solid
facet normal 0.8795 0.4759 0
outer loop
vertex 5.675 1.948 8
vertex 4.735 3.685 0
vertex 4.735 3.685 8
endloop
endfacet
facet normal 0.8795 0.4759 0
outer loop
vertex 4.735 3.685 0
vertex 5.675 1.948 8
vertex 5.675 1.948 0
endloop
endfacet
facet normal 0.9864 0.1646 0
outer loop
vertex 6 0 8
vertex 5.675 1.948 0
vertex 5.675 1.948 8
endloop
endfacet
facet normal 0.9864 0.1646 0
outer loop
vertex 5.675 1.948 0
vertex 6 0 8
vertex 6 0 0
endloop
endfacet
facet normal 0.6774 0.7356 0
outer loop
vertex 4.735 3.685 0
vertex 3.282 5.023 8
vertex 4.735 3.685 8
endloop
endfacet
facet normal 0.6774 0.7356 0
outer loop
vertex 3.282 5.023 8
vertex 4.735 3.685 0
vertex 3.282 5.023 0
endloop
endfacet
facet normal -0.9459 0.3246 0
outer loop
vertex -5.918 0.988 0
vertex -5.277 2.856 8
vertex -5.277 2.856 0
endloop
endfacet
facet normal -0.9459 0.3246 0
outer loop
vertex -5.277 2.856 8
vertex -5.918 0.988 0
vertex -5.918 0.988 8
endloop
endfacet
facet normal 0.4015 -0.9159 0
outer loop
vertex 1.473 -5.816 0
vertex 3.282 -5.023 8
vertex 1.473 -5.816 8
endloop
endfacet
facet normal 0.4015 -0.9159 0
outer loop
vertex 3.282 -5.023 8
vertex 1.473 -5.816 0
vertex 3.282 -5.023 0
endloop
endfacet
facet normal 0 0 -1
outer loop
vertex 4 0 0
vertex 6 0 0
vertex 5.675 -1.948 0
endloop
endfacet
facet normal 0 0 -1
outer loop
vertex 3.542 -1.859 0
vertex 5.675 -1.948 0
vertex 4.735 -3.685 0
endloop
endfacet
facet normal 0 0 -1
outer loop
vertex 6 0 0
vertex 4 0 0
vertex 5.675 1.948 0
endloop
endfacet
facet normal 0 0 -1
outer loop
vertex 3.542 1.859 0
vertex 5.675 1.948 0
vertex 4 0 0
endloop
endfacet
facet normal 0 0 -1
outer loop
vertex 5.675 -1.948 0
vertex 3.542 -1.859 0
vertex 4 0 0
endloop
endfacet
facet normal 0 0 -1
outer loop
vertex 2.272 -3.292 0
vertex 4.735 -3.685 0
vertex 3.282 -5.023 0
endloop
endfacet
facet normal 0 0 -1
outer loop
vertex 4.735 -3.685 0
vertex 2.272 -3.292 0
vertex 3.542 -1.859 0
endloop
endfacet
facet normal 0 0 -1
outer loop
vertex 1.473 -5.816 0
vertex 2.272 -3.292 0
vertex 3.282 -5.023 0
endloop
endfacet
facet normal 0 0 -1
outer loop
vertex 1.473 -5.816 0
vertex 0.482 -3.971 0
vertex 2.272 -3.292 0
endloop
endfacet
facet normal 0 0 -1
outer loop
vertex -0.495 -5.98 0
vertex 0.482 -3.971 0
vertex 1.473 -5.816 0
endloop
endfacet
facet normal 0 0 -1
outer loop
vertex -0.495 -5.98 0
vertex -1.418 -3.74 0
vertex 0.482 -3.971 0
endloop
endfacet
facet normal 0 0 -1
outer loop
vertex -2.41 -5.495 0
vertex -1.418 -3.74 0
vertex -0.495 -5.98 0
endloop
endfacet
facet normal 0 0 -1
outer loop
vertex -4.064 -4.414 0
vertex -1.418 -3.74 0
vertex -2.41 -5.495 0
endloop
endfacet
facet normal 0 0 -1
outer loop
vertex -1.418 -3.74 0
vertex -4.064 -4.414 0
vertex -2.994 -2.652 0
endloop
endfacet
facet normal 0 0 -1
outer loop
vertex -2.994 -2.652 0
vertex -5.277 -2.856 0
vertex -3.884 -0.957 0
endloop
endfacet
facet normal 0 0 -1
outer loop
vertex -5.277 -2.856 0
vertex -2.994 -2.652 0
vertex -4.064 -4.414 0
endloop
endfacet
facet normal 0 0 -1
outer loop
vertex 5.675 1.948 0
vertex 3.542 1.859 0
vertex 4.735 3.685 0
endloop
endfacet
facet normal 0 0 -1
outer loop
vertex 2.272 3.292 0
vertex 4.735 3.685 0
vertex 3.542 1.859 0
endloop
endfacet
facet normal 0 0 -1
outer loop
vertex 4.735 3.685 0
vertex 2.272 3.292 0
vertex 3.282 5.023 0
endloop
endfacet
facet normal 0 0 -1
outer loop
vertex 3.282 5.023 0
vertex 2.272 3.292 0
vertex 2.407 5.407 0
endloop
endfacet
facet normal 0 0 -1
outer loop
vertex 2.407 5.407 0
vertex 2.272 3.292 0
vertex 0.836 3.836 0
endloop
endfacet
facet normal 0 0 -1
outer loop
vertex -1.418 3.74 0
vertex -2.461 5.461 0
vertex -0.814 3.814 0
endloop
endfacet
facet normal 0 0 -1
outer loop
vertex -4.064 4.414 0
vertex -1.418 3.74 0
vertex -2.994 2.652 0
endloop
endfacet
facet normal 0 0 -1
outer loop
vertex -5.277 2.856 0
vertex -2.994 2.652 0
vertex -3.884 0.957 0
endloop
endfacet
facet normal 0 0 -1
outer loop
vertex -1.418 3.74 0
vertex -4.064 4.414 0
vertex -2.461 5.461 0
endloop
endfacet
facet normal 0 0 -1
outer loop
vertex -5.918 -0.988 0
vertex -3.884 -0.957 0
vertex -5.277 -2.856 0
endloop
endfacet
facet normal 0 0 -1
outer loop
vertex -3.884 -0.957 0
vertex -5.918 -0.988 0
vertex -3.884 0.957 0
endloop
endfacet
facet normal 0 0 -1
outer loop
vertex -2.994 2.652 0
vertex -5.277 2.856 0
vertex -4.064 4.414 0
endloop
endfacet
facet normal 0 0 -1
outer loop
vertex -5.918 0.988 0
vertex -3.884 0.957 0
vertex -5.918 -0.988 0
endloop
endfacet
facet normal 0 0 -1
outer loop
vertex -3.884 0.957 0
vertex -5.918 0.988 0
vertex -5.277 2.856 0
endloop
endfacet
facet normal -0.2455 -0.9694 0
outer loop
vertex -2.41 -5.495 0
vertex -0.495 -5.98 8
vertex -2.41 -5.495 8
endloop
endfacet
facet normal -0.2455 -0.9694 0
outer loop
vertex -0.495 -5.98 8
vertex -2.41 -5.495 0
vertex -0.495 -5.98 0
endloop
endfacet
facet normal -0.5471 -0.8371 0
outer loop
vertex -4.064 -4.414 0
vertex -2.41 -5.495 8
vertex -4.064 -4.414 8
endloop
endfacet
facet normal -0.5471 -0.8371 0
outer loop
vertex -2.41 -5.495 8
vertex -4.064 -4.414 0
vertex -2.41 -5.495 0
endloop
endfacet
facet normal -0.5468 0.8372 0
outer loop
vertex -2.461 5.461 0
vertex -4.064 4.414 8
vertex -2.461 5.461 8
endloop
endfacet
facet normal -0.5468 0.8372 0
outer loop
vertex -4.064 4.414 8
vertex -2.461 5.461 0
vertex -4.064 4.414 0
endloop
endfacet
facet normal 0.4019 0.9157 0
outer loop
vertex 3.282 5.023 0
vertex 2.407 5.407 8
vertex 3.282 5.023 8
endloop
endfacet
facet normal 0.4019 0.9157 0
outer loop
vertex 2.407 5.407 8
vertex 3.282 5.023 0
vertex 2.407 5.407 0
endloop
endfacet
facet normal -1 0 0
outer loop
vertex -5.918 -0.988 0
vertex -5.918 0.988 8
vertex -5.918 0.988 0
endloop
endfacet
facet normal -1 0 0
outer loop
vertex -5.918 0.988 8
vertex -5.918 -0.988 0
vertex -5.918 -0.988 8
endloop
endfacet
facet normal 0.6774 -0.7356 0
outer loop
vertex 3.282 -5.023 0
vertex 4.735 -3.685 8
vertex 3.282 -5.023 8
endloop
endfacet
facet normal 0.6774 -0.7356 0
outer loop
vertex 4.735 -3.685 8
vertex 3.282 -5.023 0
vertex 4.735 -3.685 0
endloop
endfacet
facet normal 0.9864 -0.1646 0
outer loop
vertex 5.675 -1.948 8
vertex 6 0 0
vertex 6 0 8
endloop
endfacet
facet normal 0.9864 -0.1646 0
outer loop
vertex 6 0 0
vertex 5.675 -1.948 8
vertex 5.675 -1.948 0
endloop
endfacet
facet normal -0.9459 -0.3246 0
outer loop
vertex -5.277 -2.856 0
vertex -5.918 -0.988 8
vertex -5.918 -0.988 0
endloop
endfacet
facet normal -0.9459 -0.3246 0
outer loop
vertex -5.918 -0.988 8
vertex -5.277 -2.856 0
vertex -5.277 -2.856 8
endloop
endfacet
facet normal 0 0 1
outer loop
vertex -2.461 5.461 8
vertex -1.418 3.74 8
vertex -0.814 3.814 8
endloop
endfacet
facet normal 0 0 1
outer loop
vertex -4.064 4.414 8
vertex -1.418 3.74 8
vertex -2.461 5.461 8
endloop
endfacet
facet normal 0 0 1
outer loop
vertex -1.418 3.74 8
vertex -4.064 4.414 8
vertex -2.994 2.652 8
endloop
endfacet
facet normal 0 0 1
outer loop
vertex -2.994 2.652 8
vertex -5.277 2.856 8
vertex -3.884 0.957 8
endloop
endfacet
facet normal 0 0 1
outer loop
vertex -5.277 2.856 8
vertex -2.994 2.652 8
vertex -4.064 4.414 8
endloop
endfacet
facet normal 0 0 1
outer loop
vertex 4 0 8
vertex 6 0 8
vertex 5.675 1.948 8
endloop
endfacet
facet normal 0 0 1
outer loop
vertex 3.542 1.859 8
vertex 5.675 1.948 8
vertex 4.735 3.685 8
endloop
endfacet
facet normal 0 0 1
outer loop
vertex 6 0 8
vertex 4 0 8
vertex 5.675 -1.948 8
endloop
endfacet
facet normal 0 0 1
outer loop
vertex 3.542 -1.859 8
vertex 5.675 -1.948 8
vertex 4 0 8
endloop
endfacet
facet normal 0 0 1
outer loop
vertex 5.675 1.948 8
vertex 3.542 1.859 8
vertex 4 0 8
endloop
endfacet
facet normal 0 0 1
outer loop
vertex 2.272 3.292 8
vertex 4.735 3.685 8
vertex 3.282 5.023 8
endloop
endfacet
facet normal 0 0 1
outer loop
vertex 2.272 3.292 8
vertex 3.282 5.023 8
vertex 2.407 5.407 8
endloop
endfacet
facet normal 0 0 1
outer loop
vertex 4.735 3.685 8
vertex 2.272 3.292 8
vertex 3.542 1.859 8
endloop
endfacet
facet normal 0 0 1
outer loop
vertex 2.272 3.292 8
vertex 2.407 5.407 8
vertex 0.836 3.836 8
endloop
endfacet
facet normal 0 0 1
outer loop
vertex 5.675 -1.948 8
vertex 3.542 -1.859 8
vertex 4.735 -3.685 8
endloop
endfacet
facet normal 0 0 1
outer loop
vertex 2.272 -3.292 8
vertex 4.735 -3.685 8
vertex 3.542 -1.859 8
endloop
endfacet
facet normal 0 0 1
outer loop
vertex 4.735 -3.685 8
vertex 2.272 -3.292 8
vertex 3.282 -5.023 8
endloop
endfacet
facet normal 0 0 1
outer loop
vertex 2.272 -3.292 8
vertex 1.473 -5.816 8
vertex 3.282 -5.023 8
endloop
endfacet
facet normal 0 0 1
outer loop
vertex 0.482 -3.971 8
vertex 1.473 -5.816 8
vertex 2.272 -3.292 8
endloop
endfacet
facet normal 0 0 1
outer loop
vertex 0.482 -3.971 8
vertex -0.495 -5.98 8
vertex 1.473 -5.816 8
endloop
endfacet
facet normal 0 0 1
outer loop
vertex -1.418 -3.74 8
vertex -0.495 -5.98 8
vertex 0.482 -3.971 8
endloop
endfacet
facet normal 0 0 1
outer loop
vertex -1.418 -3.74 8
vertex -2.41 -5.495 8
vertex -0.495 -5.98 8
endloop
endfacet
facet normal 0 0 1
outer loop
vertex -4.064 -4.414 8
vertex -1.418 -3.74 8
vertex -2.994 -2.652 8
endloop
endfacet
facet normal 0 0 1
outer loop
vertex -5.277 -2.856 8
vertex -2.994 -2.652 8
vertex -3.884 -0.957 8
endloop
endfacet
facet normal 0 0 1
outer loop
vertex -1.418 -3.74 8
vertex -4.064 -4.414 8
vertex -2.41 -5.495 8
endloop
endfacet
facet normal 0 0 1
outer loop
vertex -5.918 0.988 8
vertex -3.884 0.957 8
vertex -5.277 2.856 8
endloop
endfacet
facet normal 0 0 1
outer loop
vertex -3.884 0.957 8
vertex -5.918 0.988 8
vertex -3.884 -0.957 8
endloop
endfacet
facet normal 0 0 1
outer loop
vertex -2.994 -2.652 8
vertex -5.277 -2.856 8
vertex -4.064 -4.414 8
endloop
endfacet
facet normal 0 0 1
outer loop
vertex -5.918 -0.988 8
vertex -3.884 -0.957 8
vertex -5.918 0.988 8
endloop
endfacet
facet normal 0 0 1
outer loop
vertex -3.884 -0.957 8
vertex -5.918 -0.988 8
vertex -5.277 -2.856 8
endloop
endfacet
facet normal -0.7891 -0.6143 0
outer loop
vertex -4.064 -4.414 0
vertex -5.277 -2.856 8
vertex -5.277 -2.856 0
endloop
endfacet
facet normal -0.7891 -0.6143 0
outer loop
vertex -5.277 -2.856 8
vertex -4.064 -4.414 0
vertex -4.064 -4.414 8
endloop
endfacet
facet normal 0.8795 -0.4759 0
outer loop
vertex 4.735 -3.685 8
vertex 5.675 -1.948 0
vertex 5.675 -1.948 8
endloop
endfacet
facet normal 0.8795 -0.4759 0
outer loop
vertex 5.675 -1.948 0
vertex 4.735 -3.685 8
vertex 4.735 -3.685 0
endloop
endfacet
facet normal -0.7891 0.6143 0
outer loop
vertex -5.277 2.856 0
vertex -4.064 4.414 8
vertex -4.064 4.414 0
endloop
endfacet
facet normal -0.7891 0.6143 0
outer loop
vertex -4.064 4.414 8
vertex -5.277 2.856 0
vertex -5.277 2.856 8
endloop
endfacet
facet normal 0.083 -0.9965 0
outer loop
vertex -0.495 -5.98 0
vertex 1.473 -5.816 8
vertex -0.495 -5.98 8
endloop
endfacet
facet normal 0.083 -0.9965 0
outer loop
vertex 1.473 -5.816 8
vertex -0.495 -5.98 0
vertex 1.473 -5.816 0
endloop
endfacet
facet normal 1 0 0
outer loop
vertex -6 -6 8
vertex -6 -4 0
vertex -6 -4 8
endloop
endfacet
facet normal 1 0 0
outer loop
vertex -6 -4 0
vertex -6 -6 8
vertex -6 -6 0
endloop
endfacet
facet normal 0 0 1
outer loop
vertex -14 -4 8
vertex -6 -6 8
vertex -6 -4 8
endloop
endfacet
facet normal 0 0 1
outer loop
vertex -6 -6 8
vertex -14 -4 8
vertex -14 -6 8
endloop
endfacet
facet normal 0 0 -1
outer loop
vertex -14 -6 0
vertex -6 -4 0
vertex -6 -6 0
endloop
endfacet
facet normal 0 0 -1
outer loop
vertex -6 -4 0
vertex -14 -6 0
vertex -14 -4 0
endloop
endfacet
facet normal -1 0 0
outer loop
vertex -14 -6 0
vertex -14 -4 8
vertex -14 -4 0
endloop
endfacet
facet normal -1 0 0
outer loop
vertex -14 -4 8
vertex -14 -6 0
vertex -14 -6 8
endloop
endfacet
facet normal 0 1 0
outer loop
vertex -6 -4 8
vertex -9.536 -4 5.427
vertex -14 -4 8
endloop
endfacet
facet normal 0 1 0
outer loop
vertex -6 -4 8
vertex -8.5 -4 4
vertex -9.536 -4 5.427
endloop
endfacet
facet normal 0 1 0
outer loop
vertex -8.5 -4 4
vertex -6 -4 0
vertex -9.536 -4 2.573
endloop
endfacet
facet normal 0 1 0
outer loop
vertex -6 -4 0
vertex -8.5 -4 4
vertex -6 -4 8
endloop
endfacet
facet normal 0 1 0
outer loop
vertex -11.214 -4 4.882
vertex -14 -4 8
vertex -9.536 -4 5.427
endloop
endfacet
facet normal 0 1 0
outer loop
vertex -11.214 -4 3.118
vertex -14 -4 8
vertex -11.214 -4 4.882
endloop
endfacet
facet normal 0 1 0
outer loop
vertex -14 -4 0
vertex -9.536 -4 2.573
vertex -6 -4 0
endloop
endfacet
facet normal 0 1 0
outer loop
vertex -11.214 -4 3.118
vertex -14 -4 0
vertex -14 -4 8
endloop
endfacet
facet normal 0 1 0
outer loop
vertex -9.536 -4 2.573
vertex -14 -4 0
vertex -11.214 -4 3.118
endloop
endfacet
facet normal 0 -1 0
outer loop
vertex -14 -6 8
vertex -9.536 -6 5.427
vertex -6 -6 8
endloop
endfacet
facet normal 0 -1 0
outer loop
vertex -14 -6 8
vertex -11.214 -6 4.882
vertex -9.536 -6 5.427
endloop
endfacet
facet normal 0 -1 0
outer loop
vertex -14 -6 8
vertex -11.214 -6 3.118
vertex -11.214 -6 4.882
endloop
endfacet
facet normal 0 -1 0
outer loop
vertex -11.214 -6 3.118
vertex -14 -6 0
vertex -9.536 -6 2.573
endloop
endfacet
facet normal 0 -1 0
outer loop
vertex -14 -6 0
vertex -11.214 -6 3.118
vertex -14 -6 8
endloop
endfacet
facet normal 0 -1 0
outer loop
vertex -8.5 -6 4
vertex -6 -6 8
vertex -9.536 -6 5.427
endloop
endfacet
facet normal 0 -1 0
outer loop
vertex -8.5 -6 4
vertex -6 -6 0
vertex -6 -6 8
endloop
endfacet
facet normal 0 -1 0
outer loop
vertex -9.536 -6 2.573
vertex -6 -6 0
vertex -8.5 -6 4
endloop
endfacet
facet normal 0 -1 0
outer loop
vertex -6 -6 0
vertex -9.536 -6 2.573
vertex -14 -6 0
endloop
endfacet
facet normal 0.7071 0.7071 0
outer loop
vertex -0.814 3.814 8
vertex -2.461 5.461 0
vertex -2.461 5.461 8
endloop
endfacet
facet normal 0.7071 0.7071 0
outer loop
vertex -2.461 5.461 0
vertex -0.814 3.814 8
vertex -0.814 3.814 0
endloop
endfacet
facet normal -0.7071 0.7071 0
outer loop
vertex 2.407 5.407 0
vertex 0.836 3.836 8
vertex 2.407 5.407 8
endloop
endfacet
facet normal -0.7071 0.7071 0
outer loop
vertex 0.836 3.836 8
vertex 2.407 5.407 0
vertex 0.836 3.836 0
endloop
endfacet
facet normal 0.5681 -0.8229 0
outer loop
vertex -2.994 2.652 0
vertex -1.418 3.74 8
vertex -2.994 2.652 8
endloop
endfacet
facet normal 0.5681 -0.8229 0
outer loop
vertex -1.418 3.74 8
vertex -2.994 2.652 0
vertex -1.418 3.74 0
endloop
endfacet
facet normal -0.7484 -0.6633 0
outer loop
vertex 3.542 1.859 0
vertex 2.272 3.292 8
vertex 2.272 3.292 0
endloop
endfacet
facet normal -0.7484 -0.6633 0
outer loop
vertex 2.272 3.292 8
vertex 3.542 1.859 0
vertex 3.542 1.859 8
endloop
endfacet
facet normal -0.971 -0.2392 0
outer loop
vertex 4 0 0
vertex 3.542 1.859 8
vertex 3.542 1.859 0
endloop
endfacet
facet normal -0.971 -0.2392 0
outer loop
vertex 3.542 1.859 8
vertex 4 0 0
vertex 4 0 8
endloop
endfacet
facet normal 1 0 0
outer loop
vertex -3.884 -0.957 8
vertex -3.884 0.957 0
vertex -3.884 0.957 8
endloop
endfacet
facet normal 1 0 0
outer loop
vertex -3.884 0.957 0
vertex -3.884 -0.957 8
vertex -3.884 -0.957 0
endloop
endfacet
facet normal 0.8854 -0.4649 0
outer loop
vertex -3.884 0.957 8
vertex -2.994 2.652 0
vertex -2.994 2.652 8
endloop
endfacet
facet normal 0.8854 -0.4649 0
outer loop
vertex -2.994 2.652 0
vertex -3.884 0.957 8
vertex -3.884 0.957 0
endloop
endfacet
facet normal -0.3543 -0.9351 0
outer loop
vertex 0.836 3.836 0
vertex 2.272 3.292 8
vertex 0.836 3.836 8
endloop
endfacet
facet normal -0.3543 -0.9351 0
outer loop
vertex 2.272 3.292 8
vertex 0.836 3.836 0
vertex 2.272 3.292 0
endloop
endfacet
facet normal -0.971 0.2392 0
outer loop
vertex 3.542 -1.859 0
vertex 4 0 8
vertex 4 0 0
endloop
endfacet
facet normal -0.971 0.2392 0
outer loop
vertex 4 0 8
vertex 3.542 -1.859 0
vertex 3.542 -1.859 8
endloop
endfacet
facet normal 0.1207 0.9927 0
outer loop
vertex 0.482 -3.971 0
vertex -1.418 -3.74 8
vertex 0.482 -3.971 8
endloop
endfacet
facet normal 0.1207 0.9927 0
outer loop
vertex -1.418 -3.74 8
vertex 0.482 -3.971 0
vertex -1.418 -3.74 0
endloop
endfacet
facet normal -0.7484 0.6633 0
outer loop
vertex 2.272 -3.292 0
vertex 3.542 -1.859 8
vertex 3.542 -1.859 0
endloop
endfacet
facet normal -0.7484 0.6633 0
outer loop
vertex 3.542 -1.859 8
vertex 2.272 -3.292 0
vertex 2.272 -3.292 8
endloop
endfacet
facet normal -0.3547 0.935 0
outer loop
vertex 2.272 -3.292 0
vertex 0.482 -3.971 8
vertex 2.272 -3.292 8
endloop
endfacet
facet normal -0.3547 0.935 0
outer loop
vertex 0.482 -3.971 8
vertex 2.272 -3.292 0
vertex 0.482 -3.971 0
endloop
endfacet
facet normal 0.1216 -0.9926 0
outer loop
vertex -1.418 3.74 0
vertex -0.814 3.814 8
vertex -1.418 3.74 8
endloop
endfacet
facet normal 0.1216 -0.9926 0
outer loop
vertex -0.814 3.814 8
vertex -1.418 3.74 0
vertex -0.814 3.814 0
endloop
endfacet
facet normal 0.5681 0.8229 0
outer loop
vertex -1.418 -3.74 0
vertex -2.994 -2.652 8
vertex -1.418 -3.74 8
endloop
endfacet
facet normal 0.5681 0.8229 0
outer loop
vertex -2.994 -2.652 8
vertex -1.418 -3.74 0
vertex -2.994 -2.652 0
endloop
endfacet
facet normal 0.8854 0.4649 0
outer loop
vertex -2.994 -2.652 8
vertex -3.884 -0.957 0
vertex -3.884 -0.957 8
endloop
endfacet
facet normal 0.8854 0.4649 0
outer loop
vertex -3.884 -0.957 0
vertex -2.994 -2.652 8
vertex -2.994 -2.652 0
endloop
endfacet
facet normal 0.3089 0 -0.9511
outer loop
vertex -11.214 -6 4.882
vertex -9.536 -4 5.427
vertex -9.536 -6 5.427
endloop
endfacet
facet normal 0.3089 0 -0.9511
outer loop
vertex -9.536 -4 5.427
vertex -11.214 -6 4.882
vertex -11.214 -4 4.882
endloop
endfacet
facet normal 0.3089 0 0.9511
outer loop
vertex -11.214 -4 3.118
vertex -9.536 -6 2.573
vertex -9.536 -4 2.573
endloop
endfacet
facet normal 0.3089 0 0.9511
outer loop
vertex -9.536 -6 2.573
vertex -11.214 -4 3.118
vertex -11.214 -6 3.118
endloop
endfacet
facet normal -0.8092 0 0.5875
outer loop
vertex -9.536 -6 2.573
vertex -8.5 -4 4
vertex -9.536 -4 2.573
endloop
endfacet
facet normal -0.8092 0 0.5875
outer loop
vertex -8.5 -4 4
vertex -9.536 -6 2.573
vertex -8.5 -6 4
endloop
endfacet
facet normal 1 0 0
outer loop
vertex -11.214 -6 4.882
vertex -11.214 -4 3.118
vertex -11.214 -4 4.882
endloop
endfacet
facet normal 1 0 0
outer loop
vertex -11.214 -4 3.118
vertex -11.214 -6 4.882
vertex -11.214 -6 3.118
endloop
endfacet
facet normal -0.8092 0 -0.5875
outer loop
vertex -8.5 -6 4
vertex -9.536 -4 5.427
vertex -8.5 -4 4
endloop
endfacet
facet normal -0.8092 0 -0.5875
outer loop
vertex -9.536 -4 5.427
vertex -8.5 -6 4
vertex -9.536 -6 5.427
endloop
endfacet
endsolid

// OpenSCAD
// Zweck: cable clip – ring with opening, screw tab; intersection cuts the opening.
d_cable = 8; wall = 2; w = 8;
r_o = d_cable / 2 + wall;
difference() {
    union() {
        cylinder(h = w, r = r_o);
        translate([-r_o - 8, -r_o, 0]) cube([8, wall, w]);
    }
    translate([0, 0, -1]) cylinder(h = w + 2, d = d_cable);
    // Opening on top: wedge from the intersection of a cube and a rotated cube
    intersection() {
        translate([-3, 0, -1]) cube([6, r_o + 1, w + 2]);
        translate([0, r_o / 2, -1]) rotate([0, 0, 45]) cube([r_o, r_o, w + 2]);
    }
    translate([-r_o - 4, -r_o - 1, w / 2]) rotate([-90, 0, 0]) cylinder(h = wall + 2, d = 3);
}
